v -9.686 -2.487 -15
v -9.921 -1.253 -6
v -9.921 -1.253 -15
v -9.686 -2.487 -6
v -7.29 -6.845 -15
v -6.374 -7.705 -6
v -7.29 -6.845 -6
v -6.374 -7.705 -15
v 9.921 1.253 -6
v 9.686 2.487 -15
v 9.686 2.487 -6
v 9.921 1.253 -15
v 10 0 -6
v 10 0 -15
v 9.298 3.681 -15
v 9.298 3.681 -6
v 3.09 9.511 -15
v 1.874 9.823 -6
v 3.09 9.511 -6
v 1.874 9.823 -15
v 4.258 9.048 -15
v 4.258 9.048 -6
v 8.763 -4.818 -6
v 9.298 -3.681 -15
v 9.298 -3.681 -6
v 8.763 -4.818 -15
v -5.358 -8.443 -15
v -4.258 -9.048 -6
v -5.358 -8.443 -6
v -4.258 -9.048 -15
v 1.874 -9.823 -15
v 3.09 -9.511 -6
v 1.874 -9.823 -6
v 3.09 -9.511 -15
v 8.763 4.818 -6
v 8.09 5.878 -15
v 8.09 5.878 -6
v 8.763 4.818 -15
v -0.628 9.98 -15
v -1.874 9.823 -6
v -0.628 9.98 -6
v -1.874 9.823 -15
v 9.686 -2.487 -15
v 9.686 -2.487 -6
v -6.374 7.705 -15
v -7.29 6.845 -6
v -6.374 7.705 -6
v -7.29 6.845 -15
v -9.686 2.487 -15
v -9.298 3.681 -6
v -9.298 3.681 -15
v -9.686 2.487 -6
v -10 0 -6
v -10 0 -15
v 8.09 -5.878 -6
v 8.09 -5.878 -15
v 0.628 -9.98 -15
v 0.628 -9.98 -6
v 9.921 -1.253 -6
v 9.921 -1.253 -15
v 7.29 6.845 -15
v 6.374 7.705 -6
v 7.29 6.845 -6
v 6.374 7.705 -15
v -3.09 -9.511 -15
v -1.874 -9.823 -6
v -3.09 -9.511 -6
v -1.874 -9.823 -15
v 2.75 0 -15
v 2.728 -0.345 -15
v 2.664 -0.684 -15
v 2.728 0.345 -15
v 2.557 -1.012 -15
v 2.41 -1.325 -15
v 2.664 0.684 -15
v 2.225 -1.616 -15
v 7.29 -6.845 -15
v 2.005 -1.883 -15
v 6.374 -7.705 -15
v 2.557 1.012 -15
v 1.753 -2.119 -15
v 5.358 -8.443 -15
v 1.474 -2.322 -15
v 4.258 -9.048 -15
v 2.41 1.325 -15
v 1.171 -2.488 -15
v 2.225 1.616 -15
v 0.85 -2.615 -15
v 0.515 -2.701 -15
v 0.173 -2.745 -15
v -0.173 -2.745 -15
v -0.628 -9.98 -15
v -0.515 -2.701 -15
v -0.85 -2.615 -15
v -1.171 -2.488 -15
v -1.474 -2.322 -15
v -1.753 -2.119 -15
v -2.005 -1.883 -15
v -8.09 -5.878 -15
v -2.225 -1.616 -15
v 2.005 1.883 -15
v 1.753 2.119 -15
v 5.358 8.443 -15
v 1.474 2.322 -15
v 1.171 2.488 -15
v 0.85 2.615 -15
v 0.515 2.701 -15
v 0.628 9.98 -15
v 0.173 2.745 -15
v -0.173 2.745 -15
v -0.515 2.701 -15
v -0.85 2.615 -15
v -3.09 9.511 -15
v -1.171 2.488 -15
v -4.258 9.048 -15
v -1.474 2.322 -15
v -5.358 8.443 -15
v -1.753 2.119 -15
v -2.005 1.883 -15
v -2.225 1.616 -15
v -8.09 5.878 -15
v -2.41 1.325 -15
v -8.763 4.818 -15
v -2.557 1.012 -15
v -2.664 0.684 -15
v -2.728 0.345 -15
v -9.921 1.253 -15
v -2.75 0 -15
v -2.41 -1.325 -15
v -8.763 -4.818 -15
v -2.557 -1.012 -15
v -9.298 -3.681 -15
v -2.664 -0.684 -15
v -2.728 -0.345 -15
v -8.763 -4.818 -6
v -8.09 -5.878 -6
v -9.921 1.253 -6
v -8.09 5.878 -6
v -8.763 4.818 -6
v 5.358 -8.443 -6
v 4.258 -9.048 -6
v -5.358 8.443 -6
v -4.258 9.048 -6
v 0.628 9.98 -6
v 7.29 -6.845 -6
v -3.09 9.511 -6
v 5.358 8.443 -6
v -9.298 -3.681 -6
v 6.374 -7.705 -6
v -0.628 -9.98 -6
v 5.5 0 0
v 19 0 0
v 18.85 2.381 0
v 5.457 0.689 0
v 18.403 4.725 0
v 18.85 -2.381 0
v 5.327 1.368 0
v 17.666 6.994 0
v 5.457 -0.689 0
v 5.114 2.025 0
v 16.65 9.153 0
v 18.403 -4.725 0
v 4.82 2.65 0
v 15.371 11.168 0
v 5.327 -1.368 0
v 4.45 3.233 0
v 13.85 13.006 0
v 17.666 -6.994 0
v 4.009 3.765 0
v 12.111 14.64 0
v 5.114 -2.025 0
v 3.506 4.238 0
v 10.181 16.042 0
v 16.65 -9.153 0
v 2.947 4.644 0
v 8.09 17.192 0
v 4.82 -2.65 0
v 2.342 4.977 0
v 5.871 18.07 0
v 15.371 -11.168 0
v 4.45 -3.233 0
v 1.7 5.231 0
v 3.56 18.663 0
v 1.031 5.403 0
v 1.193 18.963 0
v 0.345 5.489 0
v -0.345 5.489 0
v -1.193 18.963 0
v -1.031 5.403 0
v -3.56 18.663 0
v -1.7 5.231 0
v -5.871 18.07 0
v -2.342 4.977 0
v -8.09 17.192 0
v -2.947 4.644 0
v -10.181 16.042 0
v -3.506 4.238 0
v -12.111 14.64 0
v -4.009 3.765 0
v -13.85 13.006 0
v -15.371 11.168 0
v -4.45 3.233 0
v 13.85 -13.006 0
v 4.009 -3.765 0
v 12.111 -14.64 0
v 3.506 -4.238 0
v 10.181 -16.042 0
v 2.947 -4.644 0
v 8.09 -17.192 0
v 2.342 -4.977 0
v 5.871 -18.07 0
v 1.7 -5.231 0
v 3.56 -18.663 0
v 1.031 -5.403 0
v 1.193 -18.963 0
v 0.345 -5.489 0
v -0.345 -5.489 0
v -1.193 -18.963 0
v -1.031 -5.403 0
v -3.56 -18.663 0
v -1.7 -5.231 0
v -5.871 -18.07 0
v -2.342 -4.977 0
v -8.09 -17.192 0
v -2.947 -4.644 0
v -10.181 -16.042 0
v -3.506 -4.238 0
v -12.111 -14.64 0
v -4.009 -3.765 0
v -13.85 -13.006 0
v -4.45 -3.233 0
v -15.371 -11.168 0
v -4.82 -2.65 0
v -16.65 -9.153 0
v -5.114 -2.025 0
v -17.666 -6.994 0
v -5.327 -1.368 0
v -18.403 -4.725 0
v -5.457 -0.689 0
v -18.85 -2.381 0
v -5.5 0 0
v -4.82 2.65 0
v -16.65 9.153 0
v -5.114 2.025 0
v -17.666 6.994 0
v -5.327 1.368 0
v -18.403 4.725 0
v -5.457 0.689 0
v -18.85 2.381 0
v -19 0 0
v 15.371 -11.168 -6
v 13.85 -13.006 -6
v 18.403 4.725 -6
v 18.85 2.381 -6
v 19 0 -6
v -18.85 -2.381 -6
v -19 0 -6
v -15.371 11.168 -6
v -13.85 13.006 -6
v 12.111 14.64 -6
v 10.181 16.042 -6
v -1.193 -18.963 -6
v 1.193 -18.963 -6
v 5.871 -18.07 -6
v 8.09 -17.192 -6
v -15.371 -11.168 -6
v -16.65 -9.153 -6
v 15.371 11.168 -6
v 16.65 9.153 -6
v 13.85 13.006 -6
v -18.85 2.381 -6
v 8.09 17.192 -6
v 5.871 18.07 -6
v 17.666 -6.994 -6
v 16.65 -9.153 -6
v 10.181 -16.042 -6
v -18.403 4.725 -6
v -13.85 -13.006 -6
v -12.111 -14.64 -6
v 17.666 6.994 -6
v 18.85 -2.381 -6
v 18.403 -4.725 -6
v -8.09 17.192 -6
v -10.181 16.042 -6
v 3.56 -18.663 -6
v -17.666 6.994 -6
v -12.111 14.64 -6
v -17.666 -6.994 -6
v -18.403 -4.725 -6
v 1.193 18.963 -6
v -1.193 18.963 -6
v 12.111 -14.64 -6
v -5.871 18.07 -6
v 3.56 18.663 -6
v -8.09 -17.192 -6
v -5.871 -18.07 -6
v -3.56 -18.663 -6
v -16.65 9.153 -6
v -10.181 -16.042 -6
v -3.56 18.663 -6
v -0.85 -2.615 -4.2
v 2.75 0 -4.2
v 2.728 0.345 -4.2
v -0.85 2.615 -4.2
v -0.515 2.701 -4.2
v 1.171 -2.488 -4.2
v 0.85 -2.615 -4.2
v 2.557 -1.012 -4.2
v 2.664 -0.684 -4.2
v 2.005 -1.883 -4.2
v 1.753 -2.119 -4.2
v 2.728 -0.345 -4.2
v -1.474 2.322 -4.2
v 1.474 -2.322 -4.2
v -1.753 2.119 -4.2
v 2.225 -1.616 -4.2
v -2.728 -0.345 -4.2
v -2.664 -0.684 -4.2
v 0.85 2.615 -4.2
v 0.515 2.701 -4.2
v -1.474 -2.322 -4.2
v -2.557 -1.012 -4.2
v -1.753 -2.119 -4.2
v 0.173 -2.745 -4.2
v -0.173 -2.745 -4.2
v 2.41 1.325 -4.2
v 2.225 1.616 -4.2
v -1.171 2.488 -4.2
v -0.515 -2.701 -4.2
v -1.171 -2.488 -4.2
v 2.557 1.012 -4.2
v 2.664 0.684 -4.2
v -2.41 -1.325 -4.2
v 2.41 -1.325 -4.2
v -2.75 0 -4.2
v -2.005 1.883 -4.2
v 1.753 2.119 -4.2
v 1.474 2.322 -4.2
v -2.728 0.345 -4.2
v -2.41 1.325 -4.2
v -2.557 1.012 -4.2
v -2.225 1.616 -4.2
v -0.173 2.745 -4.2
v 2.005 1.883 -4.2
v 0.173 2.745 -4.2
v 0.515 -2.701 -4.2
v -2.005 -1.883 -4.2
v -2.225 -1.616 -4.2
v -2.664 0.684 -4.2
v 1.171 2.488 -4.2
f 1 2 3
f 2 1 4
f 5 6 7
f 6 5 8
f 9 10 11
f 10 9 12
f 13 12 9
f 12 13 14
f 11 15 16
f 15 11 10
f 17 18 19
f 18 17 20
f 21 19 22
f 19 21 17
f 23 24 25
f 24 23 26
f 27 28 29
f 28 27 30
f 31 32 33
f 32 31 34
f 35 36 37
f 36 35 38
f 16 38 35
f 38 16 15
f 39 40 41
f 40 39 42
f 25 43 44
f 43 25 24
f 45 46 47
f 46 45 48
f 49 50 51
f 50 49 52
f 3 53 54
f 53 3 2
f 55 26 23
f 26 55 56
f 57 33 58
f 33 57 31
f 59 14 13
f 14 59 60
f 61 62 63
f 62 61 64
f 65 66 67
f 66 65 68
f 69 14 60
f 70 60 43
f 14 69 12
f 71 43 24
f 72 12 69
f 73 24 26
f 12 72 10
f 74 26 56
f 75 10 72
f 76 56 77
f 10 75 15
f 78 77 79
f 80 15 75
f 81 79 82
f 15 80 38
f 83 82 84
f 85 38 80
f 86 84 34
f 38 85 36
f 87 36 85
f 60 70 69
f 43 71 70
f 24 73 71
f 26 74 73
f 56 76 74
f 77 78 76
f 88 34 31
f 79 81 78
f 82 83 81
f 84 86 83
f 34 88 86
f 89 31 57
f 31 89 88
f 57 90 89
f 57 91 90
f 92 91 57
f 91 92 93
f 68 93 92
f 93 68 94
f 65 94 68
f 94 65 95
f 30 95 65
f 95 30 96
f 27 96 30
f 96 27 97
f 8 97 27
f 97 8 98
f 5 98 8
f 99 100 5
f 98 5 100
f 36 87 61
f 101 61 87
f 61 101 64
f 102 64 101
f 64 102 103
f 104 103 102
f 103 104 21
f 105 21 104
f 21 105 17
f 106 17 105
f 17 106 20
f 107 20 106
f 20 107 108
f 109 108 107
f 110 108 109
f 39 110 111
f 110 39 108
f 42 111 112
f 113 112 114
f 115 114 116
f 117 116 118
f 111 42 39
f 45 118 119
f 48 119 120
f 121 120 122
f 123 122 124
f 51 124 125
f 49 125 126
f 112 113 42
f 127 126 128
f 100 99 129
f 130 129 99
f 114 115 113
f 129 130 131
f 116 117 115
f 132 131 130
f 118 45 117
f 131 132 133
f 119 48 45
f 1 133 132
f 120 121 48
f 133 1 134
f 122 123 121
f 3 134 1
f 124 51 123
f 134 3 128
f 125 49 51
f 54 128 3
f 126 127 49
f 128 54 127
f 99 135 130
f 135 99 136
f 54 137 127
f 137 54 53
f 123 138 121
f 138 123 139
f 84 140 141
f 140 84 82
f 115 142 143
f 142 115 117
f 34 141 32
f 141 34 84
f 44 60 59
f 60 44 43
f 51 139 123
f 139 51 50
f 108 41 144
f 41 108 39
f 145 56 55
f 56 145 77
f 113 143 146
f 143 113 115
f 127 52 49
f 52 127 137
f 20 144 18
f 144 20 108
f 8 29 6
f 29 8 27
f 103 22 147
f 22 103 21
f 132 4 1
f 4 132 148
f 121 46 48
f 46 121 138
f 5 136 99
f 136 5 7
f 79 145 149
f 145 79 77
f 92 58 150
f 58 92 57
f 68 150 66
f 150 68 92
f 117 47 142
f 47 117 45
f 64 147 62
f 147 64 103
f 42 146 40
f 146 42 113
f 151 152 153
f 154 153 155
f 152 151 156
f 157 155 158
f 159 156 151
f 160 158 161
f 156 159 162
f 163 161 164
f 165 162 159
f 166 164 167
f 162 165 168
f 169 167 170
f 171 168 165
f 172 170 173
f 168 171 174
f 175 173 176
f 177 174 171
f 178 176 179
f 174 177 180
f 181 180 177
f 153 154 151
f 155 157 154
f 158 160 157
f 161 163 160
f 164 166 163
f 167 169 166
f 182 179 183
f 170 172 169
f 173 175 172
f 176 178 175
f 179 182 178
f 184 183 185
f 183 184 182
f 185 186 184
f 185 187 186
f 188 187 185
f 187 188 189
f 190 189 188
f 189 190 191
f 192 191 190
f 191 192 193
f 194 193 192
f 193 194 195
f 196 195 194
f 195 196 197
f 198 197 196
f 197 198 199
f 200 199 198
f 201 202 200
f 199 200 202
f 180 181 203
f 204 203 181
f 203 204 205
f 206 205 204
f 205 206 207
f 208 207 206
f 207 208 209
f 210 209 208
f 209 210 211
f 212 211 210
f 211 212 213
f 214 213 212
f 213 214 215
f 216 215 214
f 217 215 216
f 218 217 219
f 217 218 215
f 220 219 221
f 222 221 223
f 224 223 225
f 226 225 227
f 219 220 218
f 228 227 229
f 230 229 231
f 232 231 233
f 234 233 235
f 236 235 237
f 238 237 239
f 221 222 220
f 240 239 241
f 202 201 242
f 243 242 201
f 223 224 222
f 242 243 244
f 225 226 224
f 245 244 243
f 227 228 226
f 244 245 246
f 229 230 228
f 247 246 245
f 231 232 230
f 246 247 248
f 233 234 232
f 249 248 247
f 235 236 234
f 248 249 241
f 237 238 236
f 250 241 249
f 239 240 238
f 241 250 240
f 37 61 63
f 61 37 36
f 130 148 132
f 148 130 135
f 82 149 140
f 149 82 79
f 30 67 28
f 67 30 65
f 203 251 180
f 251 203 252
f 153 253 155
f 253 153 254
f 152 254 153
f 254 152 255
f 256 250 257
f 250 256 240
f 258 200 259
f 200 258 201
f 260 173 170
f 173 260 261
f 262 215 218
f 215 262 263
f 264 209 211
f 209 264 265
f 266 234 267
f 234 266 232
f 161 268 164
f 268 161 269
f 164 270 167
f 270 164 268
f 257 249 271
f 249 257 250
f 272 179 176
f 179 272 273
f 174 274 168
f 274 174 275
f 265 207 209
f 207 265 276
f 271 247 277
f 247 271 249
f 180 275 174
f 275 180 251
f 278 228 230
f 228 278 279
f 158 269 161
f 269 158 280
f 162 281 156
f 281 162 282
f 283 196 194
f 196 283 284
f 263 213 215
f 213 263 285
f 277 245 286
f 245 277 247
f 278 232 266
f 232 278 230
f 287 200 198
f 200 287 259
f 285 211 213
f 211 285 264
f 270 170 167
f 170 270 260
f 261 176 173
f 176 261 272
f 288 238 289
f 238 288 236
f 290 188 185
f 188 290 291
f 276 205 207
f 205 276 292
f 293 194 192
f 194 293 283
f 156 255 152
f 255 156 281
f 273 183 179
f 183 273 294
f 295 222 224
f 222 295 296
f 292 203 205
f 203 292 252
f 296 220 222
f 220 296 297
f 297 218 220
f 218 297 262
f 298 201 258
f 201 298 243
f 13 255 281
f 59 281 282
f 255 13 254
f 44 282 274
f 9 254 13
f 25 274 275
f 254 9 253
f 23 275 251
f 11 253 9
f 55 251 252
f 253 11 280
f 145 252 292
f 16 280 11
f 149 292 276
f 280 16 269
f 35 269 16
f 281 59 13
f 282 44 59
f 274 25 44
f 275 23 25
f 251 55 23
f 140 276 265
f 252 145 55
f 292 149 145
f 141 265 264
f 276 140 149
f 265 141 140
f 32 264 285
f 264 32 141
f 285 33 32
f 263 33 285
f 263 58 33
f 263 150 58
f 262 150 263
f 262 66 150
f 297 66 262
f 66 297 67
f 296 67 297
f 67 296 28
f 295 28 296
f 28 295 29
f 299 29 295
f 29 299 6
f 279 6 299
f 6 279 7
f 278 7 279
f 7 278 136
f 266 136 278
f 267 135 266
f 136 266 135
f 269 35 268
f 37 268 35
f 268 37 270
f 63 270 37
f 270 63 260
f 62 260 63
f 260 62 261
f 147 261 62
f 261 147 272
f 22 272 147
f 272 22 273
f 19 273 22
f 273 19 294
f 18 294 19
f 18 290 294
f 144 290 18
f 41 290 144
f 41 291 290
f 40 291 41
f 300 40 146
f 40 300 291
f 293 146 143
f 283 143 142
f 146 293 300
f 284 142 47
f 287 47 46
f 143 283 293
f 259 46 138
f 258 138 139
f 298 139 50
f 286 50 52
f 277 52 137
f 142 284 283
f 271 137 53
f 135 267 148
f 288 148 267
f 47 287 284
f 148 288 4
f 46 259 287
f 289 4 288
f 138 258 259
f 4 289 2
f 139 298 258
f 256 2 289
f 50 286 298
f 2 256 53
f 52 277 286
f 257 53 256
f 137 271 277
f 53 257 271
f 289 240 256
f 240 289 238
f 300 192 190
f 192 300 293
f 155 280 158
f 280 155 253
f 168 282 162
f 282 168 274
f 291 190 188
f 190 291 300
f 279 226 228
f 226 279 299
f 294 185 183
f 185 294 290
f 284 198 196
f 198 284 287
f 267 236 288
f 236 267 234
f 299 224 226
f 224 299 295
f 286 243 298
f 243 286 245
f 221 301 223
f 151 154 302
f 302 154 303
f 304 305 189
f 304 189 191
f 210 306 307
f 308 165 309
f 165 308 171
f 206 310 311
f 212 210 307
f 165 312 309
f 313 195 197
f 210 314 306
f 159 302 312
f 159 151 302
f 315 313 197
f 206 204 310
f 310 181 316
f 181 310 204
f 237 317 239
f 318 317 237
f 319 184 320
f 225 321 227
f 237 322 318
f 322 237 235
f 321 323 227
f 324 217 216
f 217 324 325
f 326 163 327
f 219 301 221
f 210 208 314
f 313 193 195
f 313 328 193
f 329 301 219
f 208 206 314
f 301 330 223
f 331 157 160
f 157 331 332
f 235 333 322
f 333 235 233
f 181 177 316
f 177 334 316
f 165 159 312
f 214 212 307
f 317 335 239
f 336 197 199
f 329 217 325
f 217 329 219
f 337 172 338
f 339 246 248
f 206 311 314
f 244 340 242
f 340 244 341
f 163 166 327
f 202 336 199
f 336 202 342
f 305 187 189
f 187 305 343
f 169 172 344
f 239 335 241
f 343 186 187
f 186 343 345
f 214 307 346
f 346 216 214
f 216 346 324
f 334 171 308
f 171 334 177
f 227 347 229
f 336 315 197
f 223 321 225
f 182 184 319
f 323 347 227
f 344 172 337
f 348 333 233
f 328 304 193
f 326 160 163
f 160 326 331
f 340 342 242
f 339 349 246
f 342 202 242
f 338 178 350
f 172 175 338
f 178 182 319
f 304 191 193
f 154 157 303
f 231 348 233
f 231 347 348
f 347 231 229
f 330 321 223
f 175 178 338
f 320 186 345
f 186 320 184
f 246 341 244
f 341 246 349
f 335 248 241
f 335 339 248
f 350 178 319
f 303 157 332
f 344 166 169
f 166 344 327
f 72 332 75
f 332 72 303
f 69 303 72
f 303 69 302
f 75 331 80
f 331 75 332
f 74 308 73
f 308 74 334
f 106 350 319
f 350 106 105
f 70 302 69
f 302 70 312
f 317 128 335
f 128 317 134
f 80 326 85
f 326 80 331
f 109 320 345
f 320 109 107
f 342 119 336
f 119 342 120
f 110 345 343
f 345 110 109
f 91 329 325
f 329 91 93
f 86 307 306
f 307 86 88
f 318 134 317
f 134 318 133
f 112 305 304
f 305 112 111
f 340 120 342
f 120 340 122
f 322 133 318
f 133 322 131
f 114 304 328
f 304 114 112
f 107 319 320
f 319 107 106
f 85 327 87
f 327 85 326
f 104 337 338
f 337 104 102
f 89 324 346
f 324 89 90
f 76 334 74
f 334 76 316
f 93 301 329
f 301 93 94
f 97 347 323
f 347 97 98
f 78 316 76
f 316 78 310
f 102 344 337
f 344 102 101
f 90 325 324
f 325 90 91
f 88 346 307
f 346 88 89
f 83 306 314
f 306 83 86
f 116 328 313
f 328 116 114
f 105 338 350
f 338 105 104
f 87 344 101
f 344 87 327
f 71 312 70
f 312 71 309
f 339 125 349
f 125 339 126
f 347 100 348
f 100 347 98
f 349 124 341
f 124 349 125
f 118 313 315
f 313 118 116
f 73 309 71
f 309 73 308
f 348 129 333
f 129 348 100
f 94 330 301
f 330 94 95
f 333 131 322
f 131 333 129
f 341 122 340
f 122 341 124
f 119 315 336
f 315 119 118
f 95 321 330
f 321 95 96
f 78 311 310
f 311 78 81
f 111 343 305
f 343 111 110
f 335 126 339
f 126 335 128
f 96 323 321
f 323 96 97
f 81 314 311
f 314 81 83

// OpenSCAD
$fn = 50;


difference() {
	union() {
		translate(v = [0, 0, -15.0000000000]) {
			cylinder(h = 15, r = 10.0000000000);
		}
		translate(v = [0, 0, -6.0000000000]) {
			cylinder(h = 6, r = 19.0000000000);
		}
	}
	union() {
		translate(v = [0, 0, 0]) {
			rotate(a = [0, 0, 0]) {
				difference() {
					union() {
						#translate(v = [0, 0, -15.0000000000]) {
							cylinder(h = 15, r = 2.2500000000);
						}
						#translate(v = [0, 0, -4.2000000000]) {
							cylinder(h = 4.2000000000, r1 = 2.7500000000, r2 = 5.5000000000);
						}
						#translate(v = [0, 0, -15.0000000000]) {
							cylinder(h = 15, r = 2.7500000000);
						}
						#translate(v = [0, 0, -15.0000000000]) {
							cylinder(h = 15, r = 2.2500000000);
						}
					}
					union();
				}
			}
		}
	}
}
